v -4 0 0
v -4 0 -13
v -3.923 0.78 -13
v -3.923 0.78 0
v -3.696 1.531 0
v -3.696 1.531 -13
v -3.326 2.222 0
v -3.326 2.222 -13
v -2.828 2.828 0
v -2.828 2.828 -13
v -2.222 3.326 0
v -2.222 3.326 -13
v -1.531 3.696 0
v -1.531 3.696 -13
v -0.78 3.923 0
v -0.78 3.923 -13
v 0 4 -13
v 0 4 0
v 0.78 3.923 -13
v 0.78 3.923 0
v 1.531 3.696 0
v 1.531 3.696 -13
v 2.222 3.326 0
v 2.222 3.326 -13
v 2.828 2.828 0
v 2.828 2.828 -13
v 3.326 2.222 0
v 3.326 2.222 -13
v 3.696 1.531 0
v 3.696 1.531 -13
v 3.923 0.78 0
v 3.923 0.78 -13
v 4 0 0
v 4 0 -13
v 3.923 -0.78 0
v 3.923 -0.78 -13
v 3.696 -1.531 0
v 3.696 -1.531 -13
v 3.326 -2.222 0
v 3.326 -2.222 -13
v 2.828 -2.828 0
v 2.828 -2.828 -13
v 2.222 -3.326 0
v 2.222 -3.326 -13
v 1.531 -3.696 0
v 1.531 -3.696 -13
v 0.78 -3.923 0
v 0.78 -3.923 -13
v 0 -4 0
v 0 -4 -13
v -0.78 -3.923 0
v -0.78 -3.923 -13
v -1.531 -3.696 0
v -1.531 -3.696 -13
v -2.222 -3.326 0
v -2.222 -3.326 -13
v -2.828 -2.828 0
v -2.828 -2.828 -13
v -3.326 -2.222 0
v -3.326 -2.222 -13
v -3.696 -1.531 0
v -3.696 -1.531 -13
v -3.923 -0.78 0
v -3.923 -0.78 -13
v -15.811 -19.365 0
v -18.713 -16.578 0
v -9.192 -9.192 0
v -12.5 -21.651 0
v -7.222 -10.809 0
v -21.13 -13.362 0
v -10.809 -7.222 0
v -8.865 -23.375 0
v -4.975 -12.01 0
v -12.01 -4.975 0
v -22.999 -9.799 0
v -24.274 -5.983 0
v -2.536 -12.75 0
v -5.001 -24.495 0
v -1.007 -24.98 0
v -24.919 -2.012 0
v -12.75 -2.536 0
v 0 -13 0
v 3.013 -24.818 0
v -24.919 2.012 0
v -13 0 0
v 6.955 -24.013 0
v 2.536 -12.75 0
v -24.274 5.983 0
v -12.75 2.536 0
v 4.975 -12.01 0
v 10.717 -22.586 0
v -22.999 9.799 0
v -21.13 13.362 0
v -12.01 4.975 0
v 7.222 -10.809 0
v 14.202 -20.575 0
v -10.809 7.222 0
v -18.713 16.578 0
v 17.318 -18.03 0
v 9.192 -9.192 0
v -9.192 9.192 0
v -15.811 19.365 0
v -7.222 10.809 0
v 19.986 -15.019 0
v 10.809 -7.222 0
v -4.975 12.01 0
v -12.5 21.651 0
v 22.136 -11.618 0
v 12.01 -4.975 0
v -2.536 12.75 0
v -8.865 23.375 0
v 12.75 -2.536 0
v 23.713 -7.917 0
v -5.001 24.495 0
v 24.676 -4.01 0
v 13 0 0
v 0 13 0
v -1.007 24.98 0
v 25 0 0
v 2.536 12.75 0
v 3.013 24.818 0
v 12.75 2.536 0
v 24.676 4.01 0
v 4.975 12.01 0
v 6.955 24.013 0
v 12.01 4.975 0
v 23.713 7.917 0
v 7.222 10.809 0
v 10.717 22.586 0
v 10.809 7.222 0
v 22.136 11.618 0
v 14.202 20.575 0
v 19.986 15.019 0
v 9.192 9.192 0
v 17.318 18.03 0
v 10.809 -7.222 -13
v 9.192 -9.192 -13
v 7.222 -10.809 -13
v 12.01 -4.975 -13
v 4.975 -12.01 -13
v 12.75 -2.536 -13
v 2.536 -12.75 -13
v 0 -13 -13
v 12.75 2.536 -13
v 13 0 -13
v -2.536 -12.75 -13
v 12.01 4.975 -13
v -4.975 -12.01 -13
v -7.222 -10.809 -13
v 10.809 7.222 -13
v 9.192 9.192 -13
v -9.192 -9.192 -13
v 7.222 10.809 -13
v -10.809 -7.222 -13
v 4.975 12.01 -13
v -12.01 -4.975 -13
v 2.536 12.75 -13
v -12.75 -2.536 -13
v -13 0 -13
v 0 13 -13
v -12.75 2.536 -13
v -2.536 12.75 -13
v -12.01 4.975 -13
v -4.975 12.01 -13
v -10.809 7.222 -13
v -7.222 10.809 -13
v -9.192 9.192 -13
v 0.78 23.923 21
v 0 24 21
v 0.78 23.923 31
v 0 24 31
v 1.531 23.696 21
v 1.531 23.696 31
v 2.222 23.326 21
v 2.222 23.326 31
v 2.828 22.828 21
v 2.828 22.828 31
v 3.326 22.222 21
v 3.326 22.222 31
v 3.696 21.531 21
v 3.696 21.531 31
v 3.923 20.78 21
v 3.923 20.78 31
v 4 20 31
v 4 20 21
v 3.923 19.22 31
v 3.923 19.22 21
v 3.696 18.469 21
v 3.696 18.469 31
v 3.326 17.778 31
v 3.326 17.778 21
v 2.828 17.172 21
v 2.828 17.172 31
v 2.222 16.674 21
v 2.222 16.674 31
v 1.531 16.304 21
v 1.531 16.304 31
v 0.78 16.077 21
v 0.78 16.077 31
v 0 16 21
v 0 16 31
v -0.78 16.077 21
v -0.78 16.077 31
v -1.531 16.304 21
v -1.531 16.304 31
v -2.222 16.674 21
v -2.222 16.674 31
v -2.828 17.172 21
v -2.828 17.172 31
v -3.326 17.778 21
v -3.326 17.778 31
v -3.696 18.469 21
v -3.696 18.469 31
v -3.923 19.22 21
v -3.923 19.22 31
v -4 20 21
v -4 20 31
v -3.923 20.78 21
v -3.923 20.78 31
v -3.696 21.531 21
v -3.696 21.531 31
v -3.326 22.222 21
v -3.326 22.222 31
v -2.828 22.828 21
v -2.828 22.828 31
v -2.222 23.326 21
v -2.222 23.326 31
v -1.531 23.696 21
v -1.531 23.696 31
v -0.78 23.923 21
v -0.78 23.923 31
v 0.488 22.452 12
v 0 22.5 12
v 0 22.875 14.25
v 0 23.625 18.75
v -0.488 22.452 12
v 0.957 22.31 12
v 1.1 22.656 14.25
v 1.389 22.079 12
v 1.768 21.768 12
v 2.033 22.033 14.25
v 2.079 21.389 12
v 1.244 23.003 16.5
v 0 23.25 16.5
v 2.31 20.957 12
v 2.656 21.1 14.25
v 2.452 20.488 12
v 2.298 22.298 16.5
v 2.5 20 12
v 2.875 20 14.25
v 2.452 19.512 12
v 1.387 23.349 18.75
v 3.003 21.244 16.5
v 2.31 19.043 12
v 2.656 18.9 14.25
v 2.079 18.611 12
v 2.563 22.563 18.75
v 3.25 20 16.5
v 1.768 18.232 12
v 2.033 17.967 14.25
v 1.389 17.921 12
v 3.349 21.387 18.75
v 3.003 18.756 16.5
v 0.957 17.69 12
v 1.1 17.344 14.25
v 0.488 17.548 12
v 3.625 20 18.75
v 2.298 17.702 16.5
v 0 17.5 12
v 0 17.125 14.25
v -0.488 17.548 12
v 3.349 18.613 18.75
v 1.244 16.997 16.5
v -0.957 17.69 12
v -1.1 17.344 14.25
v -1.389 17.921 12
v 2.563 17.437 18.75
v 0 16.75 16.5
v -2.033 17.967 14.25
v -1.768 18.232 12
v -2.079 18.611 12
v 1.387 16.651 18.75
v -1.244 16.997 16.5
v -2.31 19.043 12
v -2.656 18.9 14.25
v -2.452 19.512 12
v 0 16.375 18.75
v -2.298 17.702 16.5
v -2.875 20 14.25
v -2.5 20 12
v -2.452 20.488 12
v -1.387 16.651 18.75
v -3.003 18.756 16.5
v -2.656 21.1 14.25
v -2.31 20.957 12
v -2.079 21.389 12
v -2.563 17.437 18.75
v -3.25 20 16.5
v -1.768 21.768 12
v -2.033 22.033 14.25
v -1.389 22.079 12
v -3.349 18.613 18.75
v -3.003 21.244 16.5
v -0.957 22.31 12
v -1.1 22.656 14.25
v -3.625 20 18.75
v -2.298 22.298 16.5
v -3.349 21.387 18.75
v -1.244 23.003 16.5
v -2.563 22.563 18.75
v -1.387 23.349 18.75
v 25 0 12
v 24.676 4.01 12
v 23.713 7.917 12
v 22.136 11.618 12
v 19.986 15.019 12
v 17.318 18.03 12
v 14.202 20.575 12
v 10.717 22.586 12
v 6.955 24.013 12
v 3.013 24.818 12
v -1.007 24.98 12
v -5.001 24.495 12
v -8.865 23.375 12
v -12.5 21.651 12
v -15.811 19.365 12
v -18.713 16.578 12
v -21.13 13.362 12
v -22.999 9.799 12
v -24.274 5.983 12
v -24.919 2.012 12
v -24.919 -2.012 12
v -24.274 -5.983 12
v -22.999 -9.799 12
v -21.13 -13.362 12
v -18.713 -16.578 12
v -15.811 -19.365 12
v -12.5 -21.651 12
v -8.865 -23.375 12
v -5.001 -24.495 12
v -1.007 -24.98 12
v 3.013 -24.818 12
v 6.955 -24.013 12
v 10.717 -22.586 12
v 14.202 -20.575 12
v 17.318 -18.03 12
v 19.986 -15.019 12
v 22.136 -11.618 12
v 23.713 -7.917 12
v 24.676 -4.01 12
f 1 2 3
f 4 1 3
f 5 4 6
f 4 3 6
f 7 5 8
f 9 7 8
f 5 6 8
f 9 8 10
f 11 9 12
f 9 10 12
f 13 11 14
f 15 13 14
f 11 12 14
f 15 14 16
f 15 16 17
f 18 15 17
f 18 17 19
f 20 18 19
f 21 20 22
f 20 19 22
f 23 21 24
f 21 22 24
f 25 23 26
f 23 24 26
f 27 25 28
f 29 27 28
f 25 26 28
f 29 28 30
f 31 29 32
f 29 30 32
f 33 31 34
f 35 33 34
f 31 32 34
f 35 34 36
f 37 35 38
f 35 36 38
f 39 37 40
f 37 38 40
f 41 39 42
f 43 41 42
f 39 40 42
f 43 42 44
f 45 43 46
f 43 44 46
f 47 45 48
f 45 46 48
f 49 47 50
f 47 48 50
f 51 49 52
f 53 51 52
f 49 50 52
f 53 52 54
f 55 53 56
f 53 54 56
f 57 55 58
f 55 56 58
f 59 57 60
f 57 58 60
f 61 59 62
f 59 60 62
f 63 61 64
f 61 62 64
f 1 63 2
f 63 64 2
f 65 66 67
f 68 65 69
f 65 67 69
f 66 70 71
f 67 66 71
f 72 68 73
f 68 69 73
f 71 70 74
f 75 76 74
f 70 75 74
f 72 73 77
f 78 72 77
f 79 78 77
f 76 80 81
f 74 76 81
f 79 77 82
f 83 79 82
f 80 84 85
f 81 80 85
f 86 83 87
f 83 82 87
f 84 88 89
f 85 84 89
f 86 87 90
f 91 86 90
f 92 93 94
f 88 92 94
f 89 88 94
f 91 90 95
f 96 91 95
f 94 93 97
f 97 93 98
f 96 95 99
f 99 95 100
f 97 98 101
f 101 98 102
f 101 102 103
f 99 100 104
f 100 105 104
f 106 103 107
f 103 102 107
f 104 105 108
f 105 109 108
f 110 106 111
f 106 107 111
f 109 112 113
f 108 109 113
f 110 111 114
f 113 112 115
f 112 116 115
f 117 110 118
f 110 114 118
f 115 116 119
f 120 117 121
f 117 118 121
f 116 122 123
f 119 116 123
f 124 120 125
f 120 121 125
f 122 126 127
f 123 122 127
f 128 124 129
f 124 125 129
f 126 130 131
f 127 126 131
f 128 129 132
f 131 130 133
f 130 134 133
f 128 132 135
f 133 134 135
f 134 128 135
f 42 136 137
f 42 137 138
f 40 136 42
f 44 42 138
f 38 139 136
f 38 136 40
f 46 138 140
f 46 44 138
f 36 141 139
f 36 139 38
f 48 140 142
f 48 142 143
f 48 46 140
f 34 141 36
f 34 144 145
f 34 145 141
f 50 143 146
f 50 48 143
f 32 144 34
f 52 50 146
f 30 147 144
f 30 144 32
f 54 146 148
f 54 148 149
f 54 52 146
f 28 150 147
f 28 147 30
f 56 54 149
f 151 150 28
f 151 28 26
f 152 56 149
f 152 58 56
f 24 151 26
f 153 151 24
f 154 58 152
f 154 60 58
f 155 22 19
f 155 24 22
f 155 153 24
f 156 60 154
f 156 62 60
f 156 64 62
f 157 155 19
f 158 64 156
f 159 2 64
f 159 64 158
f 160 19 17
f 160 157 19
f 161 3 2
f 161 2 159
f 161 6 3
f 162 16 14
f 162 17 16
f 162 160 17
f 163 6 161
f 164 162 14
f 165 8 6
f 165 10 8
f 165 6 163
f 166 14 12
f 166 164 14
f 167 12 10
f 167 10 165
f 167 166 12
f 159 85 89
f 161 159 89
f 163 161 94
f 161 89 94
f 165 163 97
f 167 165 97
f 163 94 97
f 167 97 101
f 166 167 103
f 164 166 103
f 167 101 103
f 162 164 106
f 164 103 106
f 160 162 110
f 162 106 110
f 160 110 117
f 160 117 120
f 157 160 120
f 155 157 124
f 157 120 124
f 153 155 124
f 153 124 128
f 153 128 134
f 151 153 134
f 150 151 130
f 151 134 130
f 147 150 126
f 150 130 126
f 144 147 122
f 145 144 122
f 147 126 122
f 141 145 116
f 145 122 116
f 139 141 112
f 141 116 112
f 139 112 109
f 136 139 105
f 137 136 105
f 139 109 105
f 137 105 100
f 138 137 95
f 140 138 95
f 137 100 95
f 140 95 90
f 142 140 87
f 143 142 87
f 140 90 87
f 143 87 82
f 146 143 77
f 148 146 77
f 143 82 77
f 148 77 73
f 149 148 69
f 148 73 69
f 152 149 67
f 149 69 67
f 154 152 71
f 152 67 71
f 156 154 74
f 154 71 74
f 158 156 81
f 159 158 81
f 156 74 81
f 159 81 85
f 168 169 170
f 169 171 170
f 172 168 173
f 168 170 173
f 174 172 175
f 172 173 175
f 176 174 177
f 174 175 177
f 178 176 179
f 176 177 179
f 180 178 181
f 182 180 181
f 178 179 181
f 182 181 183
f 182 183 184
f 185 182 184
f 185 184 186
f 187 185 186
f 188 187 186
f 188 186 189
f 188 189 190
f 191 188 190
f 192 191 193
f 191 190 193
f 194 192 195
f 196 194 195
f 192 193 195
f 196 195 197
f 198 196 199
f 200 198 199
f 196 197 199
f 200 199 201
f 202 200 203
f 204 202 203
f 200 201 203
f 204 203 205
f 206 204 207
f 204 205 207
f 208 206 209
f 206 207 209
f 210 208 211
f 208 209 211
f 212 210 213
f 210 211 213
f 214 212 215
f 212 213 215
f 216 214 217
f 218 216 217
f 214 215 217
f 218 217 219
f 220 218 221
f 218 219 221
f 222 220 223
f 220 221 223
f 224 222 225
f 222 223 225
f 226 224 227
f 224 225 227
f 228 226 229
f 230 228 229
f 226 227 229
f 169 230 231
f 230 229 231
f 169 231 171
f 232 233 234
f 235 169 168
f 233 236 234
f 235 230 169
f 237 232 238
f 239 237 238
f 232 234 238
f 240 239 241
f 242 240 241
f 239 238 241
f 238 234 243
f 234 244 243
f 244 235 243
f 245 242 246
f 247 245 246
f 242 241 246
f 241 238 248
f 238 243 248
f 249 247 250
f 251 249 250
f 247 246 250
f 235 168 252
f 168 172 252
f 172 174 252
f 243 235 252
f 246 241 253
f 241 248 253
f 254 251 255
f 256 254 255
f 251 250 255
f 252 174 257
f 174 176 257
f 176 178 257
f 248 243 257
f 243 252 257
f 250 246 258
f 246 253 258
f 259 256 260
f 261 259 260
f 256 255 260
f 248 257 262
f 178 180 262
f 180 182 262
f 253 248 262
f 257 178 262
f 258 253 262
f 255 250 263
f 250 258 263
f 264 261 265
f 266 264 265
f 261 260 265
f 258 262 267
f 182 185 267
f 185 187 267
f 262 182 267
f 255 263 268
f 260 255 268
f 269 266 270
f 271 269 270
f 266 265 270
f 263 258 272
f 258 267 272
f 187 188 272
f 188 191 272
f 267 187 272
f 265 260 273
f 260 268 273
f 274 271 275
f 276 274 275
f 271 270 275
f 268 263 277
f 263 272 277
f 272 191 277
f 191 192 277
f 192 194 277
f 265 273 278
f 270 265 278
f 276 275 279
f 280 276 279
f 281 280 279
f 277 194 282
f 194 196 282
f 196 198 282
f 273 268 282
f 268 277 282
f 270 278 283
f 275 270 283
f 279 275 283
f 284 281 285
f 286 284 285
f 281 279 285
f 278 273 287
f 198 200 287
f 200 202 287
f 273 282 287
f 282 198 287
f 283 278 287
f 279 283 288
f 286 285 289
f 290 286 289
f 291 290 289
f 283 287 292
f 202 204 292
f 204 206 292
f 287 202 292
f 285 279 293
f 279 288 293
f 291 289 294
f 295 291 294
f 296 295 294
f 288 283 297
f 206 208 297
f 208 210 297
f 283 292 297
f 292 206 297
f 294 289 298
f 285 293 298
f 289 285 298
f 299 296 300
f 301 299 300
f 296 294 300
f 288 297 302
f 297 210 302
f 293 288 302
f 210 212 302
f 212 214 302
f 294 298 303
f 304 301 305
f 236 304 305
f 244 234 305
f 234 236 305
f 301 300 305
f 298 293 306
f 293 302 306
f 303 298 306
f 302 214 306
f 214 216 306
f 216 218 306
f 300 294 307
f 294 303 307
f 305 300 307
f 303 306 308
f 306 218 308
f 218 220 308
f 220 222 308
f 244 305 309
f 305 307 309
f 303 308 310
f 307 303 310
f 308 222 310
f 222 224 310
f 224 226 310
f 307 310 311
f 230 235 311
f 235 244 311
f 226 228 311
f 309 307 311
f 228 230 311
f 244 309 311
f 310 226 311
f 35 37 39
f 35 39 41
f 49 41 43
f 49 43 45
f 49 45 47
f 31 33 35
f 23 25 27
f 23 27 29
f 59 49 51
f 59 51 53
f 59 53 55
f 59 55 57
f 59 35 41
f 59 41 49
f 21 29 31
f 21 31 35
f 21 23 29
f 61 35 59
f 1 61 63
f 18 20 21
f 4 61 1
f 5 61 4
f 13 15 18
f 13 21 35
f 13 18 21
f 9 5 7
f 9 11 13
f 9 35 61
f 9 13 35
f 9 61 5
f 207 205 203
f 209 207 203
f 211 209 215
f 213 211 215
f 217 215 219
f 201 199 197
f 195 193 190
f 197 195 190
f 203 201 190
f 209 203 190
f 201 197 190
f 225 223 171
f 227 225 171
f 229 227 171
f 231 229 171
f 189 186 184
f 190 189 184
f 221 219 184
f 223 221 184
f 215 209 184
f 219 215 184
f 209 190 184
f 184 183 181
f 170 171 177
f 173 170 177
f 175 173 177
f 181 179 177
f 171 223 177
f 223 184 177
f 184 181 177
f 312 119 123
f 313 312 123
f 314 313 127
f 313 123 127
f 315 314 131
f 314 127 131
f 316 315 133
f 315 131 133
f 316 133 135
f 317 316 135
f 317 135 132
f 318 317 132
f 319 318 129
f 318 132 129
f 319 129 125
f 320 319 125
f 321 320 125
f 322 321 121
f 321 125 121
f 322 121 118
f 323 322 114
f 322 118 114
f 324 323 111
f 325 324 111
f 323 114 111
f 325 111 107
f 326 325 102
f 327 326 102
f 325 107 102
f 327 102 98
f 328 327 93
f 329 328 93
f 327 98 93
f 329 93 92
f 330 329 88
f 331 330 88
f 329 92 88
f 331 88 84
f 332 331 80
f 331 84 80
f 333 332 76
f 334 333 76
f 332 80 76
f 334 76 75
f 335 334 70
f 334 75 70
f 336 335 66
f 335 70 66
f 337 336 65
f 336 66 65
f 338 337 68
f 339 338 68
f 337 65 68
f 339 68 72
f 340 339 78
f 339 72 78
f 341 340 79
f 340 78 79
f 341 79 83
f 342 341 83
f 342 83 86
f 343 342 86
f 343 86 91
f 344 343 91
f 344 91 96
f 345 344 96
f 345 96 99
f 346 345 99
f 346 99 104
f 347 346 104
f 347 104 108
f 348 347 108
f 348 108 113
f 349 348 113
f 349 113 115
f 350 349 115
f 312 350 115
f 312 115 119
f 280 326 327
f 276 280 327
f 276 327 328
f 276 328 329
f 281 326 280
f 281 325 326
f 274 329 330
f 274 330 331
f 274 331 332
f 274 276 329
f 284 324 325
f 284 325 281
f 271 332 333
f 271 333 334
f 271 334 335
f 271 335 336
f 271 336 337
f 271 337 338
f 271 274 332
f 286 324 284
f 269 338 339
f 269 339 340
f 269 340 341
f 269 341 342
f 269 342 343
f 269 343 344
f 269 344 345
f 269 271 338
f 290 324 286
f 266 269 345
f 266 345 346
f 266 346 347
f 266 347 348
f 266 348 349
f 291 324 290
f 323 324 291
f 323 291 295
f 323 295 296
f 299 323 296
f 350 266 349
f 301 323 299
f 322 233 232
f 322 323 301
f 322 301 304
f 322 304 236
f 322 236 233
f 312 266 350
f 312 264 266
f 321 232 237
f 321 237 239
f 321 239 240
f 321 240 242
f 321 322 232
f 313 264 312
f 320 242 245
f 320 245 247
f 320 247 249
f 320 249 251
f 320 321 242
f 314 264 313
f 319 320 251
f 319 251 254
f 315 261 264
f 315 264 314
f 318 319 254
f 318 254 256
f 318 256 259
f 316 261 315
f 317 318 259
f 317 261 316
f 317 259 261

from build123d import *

# Parameters (mm, degrees)
SKETCH_1_R          = 25
EXTRUDE_1_DEPTH     = 12
SKETCH_2_R          = 13
EXTRUDE_2_DEPTH     = 13
SKETCH_3_R          = 4
CUT_EXTRUDE_1_DEPTH = 13


with BuildPart() as part:
    # 草图1 → 凸台-拉伸1 (new body)
    with BuildSketch(Plane.XY):
        Circle(SKETCH_1_R)
    extrude(amount=EXTRUDE_1_DEPTH)

    # 草图2 → 凸台-拉伸2 (add)
    with BuildSketch(Plane(origin=(0, 0, 0), x_dir=(-1, 0, 0), z_dir=(0, 0, -1))):
        Circle(SKETCH_2_R)
    extrude(amount=EXTRUDE_2_DEPTH)

    # 草图3 → 切除-拉伸1 (cut)
    with BuildSketch(Plane(origin=(0, 0, -13), x_dir=(-1, 0, 0), z_dir=(0, 0, -1))):
        Circle(SKETCH_3_R)
    extrude(amount=-CUT_EXTRUDE_1_DEPTH, mode=Mode.SUBTRACT)

    # 草图4 → 旋转1 (revolve)
    with BuildSketch(Plane(origin=(0, 0, 0), x_dir=(0, 0, -1), z_dir=(1, 0, 0))):
        Polygon((-12, 22.5), (-21, 24), (-31, 24), (-31, 20), (-12, 20), align=None)
    revolve(axis=Axis((0, 20, 31), (0, 0, -1)))


solid = part.part
